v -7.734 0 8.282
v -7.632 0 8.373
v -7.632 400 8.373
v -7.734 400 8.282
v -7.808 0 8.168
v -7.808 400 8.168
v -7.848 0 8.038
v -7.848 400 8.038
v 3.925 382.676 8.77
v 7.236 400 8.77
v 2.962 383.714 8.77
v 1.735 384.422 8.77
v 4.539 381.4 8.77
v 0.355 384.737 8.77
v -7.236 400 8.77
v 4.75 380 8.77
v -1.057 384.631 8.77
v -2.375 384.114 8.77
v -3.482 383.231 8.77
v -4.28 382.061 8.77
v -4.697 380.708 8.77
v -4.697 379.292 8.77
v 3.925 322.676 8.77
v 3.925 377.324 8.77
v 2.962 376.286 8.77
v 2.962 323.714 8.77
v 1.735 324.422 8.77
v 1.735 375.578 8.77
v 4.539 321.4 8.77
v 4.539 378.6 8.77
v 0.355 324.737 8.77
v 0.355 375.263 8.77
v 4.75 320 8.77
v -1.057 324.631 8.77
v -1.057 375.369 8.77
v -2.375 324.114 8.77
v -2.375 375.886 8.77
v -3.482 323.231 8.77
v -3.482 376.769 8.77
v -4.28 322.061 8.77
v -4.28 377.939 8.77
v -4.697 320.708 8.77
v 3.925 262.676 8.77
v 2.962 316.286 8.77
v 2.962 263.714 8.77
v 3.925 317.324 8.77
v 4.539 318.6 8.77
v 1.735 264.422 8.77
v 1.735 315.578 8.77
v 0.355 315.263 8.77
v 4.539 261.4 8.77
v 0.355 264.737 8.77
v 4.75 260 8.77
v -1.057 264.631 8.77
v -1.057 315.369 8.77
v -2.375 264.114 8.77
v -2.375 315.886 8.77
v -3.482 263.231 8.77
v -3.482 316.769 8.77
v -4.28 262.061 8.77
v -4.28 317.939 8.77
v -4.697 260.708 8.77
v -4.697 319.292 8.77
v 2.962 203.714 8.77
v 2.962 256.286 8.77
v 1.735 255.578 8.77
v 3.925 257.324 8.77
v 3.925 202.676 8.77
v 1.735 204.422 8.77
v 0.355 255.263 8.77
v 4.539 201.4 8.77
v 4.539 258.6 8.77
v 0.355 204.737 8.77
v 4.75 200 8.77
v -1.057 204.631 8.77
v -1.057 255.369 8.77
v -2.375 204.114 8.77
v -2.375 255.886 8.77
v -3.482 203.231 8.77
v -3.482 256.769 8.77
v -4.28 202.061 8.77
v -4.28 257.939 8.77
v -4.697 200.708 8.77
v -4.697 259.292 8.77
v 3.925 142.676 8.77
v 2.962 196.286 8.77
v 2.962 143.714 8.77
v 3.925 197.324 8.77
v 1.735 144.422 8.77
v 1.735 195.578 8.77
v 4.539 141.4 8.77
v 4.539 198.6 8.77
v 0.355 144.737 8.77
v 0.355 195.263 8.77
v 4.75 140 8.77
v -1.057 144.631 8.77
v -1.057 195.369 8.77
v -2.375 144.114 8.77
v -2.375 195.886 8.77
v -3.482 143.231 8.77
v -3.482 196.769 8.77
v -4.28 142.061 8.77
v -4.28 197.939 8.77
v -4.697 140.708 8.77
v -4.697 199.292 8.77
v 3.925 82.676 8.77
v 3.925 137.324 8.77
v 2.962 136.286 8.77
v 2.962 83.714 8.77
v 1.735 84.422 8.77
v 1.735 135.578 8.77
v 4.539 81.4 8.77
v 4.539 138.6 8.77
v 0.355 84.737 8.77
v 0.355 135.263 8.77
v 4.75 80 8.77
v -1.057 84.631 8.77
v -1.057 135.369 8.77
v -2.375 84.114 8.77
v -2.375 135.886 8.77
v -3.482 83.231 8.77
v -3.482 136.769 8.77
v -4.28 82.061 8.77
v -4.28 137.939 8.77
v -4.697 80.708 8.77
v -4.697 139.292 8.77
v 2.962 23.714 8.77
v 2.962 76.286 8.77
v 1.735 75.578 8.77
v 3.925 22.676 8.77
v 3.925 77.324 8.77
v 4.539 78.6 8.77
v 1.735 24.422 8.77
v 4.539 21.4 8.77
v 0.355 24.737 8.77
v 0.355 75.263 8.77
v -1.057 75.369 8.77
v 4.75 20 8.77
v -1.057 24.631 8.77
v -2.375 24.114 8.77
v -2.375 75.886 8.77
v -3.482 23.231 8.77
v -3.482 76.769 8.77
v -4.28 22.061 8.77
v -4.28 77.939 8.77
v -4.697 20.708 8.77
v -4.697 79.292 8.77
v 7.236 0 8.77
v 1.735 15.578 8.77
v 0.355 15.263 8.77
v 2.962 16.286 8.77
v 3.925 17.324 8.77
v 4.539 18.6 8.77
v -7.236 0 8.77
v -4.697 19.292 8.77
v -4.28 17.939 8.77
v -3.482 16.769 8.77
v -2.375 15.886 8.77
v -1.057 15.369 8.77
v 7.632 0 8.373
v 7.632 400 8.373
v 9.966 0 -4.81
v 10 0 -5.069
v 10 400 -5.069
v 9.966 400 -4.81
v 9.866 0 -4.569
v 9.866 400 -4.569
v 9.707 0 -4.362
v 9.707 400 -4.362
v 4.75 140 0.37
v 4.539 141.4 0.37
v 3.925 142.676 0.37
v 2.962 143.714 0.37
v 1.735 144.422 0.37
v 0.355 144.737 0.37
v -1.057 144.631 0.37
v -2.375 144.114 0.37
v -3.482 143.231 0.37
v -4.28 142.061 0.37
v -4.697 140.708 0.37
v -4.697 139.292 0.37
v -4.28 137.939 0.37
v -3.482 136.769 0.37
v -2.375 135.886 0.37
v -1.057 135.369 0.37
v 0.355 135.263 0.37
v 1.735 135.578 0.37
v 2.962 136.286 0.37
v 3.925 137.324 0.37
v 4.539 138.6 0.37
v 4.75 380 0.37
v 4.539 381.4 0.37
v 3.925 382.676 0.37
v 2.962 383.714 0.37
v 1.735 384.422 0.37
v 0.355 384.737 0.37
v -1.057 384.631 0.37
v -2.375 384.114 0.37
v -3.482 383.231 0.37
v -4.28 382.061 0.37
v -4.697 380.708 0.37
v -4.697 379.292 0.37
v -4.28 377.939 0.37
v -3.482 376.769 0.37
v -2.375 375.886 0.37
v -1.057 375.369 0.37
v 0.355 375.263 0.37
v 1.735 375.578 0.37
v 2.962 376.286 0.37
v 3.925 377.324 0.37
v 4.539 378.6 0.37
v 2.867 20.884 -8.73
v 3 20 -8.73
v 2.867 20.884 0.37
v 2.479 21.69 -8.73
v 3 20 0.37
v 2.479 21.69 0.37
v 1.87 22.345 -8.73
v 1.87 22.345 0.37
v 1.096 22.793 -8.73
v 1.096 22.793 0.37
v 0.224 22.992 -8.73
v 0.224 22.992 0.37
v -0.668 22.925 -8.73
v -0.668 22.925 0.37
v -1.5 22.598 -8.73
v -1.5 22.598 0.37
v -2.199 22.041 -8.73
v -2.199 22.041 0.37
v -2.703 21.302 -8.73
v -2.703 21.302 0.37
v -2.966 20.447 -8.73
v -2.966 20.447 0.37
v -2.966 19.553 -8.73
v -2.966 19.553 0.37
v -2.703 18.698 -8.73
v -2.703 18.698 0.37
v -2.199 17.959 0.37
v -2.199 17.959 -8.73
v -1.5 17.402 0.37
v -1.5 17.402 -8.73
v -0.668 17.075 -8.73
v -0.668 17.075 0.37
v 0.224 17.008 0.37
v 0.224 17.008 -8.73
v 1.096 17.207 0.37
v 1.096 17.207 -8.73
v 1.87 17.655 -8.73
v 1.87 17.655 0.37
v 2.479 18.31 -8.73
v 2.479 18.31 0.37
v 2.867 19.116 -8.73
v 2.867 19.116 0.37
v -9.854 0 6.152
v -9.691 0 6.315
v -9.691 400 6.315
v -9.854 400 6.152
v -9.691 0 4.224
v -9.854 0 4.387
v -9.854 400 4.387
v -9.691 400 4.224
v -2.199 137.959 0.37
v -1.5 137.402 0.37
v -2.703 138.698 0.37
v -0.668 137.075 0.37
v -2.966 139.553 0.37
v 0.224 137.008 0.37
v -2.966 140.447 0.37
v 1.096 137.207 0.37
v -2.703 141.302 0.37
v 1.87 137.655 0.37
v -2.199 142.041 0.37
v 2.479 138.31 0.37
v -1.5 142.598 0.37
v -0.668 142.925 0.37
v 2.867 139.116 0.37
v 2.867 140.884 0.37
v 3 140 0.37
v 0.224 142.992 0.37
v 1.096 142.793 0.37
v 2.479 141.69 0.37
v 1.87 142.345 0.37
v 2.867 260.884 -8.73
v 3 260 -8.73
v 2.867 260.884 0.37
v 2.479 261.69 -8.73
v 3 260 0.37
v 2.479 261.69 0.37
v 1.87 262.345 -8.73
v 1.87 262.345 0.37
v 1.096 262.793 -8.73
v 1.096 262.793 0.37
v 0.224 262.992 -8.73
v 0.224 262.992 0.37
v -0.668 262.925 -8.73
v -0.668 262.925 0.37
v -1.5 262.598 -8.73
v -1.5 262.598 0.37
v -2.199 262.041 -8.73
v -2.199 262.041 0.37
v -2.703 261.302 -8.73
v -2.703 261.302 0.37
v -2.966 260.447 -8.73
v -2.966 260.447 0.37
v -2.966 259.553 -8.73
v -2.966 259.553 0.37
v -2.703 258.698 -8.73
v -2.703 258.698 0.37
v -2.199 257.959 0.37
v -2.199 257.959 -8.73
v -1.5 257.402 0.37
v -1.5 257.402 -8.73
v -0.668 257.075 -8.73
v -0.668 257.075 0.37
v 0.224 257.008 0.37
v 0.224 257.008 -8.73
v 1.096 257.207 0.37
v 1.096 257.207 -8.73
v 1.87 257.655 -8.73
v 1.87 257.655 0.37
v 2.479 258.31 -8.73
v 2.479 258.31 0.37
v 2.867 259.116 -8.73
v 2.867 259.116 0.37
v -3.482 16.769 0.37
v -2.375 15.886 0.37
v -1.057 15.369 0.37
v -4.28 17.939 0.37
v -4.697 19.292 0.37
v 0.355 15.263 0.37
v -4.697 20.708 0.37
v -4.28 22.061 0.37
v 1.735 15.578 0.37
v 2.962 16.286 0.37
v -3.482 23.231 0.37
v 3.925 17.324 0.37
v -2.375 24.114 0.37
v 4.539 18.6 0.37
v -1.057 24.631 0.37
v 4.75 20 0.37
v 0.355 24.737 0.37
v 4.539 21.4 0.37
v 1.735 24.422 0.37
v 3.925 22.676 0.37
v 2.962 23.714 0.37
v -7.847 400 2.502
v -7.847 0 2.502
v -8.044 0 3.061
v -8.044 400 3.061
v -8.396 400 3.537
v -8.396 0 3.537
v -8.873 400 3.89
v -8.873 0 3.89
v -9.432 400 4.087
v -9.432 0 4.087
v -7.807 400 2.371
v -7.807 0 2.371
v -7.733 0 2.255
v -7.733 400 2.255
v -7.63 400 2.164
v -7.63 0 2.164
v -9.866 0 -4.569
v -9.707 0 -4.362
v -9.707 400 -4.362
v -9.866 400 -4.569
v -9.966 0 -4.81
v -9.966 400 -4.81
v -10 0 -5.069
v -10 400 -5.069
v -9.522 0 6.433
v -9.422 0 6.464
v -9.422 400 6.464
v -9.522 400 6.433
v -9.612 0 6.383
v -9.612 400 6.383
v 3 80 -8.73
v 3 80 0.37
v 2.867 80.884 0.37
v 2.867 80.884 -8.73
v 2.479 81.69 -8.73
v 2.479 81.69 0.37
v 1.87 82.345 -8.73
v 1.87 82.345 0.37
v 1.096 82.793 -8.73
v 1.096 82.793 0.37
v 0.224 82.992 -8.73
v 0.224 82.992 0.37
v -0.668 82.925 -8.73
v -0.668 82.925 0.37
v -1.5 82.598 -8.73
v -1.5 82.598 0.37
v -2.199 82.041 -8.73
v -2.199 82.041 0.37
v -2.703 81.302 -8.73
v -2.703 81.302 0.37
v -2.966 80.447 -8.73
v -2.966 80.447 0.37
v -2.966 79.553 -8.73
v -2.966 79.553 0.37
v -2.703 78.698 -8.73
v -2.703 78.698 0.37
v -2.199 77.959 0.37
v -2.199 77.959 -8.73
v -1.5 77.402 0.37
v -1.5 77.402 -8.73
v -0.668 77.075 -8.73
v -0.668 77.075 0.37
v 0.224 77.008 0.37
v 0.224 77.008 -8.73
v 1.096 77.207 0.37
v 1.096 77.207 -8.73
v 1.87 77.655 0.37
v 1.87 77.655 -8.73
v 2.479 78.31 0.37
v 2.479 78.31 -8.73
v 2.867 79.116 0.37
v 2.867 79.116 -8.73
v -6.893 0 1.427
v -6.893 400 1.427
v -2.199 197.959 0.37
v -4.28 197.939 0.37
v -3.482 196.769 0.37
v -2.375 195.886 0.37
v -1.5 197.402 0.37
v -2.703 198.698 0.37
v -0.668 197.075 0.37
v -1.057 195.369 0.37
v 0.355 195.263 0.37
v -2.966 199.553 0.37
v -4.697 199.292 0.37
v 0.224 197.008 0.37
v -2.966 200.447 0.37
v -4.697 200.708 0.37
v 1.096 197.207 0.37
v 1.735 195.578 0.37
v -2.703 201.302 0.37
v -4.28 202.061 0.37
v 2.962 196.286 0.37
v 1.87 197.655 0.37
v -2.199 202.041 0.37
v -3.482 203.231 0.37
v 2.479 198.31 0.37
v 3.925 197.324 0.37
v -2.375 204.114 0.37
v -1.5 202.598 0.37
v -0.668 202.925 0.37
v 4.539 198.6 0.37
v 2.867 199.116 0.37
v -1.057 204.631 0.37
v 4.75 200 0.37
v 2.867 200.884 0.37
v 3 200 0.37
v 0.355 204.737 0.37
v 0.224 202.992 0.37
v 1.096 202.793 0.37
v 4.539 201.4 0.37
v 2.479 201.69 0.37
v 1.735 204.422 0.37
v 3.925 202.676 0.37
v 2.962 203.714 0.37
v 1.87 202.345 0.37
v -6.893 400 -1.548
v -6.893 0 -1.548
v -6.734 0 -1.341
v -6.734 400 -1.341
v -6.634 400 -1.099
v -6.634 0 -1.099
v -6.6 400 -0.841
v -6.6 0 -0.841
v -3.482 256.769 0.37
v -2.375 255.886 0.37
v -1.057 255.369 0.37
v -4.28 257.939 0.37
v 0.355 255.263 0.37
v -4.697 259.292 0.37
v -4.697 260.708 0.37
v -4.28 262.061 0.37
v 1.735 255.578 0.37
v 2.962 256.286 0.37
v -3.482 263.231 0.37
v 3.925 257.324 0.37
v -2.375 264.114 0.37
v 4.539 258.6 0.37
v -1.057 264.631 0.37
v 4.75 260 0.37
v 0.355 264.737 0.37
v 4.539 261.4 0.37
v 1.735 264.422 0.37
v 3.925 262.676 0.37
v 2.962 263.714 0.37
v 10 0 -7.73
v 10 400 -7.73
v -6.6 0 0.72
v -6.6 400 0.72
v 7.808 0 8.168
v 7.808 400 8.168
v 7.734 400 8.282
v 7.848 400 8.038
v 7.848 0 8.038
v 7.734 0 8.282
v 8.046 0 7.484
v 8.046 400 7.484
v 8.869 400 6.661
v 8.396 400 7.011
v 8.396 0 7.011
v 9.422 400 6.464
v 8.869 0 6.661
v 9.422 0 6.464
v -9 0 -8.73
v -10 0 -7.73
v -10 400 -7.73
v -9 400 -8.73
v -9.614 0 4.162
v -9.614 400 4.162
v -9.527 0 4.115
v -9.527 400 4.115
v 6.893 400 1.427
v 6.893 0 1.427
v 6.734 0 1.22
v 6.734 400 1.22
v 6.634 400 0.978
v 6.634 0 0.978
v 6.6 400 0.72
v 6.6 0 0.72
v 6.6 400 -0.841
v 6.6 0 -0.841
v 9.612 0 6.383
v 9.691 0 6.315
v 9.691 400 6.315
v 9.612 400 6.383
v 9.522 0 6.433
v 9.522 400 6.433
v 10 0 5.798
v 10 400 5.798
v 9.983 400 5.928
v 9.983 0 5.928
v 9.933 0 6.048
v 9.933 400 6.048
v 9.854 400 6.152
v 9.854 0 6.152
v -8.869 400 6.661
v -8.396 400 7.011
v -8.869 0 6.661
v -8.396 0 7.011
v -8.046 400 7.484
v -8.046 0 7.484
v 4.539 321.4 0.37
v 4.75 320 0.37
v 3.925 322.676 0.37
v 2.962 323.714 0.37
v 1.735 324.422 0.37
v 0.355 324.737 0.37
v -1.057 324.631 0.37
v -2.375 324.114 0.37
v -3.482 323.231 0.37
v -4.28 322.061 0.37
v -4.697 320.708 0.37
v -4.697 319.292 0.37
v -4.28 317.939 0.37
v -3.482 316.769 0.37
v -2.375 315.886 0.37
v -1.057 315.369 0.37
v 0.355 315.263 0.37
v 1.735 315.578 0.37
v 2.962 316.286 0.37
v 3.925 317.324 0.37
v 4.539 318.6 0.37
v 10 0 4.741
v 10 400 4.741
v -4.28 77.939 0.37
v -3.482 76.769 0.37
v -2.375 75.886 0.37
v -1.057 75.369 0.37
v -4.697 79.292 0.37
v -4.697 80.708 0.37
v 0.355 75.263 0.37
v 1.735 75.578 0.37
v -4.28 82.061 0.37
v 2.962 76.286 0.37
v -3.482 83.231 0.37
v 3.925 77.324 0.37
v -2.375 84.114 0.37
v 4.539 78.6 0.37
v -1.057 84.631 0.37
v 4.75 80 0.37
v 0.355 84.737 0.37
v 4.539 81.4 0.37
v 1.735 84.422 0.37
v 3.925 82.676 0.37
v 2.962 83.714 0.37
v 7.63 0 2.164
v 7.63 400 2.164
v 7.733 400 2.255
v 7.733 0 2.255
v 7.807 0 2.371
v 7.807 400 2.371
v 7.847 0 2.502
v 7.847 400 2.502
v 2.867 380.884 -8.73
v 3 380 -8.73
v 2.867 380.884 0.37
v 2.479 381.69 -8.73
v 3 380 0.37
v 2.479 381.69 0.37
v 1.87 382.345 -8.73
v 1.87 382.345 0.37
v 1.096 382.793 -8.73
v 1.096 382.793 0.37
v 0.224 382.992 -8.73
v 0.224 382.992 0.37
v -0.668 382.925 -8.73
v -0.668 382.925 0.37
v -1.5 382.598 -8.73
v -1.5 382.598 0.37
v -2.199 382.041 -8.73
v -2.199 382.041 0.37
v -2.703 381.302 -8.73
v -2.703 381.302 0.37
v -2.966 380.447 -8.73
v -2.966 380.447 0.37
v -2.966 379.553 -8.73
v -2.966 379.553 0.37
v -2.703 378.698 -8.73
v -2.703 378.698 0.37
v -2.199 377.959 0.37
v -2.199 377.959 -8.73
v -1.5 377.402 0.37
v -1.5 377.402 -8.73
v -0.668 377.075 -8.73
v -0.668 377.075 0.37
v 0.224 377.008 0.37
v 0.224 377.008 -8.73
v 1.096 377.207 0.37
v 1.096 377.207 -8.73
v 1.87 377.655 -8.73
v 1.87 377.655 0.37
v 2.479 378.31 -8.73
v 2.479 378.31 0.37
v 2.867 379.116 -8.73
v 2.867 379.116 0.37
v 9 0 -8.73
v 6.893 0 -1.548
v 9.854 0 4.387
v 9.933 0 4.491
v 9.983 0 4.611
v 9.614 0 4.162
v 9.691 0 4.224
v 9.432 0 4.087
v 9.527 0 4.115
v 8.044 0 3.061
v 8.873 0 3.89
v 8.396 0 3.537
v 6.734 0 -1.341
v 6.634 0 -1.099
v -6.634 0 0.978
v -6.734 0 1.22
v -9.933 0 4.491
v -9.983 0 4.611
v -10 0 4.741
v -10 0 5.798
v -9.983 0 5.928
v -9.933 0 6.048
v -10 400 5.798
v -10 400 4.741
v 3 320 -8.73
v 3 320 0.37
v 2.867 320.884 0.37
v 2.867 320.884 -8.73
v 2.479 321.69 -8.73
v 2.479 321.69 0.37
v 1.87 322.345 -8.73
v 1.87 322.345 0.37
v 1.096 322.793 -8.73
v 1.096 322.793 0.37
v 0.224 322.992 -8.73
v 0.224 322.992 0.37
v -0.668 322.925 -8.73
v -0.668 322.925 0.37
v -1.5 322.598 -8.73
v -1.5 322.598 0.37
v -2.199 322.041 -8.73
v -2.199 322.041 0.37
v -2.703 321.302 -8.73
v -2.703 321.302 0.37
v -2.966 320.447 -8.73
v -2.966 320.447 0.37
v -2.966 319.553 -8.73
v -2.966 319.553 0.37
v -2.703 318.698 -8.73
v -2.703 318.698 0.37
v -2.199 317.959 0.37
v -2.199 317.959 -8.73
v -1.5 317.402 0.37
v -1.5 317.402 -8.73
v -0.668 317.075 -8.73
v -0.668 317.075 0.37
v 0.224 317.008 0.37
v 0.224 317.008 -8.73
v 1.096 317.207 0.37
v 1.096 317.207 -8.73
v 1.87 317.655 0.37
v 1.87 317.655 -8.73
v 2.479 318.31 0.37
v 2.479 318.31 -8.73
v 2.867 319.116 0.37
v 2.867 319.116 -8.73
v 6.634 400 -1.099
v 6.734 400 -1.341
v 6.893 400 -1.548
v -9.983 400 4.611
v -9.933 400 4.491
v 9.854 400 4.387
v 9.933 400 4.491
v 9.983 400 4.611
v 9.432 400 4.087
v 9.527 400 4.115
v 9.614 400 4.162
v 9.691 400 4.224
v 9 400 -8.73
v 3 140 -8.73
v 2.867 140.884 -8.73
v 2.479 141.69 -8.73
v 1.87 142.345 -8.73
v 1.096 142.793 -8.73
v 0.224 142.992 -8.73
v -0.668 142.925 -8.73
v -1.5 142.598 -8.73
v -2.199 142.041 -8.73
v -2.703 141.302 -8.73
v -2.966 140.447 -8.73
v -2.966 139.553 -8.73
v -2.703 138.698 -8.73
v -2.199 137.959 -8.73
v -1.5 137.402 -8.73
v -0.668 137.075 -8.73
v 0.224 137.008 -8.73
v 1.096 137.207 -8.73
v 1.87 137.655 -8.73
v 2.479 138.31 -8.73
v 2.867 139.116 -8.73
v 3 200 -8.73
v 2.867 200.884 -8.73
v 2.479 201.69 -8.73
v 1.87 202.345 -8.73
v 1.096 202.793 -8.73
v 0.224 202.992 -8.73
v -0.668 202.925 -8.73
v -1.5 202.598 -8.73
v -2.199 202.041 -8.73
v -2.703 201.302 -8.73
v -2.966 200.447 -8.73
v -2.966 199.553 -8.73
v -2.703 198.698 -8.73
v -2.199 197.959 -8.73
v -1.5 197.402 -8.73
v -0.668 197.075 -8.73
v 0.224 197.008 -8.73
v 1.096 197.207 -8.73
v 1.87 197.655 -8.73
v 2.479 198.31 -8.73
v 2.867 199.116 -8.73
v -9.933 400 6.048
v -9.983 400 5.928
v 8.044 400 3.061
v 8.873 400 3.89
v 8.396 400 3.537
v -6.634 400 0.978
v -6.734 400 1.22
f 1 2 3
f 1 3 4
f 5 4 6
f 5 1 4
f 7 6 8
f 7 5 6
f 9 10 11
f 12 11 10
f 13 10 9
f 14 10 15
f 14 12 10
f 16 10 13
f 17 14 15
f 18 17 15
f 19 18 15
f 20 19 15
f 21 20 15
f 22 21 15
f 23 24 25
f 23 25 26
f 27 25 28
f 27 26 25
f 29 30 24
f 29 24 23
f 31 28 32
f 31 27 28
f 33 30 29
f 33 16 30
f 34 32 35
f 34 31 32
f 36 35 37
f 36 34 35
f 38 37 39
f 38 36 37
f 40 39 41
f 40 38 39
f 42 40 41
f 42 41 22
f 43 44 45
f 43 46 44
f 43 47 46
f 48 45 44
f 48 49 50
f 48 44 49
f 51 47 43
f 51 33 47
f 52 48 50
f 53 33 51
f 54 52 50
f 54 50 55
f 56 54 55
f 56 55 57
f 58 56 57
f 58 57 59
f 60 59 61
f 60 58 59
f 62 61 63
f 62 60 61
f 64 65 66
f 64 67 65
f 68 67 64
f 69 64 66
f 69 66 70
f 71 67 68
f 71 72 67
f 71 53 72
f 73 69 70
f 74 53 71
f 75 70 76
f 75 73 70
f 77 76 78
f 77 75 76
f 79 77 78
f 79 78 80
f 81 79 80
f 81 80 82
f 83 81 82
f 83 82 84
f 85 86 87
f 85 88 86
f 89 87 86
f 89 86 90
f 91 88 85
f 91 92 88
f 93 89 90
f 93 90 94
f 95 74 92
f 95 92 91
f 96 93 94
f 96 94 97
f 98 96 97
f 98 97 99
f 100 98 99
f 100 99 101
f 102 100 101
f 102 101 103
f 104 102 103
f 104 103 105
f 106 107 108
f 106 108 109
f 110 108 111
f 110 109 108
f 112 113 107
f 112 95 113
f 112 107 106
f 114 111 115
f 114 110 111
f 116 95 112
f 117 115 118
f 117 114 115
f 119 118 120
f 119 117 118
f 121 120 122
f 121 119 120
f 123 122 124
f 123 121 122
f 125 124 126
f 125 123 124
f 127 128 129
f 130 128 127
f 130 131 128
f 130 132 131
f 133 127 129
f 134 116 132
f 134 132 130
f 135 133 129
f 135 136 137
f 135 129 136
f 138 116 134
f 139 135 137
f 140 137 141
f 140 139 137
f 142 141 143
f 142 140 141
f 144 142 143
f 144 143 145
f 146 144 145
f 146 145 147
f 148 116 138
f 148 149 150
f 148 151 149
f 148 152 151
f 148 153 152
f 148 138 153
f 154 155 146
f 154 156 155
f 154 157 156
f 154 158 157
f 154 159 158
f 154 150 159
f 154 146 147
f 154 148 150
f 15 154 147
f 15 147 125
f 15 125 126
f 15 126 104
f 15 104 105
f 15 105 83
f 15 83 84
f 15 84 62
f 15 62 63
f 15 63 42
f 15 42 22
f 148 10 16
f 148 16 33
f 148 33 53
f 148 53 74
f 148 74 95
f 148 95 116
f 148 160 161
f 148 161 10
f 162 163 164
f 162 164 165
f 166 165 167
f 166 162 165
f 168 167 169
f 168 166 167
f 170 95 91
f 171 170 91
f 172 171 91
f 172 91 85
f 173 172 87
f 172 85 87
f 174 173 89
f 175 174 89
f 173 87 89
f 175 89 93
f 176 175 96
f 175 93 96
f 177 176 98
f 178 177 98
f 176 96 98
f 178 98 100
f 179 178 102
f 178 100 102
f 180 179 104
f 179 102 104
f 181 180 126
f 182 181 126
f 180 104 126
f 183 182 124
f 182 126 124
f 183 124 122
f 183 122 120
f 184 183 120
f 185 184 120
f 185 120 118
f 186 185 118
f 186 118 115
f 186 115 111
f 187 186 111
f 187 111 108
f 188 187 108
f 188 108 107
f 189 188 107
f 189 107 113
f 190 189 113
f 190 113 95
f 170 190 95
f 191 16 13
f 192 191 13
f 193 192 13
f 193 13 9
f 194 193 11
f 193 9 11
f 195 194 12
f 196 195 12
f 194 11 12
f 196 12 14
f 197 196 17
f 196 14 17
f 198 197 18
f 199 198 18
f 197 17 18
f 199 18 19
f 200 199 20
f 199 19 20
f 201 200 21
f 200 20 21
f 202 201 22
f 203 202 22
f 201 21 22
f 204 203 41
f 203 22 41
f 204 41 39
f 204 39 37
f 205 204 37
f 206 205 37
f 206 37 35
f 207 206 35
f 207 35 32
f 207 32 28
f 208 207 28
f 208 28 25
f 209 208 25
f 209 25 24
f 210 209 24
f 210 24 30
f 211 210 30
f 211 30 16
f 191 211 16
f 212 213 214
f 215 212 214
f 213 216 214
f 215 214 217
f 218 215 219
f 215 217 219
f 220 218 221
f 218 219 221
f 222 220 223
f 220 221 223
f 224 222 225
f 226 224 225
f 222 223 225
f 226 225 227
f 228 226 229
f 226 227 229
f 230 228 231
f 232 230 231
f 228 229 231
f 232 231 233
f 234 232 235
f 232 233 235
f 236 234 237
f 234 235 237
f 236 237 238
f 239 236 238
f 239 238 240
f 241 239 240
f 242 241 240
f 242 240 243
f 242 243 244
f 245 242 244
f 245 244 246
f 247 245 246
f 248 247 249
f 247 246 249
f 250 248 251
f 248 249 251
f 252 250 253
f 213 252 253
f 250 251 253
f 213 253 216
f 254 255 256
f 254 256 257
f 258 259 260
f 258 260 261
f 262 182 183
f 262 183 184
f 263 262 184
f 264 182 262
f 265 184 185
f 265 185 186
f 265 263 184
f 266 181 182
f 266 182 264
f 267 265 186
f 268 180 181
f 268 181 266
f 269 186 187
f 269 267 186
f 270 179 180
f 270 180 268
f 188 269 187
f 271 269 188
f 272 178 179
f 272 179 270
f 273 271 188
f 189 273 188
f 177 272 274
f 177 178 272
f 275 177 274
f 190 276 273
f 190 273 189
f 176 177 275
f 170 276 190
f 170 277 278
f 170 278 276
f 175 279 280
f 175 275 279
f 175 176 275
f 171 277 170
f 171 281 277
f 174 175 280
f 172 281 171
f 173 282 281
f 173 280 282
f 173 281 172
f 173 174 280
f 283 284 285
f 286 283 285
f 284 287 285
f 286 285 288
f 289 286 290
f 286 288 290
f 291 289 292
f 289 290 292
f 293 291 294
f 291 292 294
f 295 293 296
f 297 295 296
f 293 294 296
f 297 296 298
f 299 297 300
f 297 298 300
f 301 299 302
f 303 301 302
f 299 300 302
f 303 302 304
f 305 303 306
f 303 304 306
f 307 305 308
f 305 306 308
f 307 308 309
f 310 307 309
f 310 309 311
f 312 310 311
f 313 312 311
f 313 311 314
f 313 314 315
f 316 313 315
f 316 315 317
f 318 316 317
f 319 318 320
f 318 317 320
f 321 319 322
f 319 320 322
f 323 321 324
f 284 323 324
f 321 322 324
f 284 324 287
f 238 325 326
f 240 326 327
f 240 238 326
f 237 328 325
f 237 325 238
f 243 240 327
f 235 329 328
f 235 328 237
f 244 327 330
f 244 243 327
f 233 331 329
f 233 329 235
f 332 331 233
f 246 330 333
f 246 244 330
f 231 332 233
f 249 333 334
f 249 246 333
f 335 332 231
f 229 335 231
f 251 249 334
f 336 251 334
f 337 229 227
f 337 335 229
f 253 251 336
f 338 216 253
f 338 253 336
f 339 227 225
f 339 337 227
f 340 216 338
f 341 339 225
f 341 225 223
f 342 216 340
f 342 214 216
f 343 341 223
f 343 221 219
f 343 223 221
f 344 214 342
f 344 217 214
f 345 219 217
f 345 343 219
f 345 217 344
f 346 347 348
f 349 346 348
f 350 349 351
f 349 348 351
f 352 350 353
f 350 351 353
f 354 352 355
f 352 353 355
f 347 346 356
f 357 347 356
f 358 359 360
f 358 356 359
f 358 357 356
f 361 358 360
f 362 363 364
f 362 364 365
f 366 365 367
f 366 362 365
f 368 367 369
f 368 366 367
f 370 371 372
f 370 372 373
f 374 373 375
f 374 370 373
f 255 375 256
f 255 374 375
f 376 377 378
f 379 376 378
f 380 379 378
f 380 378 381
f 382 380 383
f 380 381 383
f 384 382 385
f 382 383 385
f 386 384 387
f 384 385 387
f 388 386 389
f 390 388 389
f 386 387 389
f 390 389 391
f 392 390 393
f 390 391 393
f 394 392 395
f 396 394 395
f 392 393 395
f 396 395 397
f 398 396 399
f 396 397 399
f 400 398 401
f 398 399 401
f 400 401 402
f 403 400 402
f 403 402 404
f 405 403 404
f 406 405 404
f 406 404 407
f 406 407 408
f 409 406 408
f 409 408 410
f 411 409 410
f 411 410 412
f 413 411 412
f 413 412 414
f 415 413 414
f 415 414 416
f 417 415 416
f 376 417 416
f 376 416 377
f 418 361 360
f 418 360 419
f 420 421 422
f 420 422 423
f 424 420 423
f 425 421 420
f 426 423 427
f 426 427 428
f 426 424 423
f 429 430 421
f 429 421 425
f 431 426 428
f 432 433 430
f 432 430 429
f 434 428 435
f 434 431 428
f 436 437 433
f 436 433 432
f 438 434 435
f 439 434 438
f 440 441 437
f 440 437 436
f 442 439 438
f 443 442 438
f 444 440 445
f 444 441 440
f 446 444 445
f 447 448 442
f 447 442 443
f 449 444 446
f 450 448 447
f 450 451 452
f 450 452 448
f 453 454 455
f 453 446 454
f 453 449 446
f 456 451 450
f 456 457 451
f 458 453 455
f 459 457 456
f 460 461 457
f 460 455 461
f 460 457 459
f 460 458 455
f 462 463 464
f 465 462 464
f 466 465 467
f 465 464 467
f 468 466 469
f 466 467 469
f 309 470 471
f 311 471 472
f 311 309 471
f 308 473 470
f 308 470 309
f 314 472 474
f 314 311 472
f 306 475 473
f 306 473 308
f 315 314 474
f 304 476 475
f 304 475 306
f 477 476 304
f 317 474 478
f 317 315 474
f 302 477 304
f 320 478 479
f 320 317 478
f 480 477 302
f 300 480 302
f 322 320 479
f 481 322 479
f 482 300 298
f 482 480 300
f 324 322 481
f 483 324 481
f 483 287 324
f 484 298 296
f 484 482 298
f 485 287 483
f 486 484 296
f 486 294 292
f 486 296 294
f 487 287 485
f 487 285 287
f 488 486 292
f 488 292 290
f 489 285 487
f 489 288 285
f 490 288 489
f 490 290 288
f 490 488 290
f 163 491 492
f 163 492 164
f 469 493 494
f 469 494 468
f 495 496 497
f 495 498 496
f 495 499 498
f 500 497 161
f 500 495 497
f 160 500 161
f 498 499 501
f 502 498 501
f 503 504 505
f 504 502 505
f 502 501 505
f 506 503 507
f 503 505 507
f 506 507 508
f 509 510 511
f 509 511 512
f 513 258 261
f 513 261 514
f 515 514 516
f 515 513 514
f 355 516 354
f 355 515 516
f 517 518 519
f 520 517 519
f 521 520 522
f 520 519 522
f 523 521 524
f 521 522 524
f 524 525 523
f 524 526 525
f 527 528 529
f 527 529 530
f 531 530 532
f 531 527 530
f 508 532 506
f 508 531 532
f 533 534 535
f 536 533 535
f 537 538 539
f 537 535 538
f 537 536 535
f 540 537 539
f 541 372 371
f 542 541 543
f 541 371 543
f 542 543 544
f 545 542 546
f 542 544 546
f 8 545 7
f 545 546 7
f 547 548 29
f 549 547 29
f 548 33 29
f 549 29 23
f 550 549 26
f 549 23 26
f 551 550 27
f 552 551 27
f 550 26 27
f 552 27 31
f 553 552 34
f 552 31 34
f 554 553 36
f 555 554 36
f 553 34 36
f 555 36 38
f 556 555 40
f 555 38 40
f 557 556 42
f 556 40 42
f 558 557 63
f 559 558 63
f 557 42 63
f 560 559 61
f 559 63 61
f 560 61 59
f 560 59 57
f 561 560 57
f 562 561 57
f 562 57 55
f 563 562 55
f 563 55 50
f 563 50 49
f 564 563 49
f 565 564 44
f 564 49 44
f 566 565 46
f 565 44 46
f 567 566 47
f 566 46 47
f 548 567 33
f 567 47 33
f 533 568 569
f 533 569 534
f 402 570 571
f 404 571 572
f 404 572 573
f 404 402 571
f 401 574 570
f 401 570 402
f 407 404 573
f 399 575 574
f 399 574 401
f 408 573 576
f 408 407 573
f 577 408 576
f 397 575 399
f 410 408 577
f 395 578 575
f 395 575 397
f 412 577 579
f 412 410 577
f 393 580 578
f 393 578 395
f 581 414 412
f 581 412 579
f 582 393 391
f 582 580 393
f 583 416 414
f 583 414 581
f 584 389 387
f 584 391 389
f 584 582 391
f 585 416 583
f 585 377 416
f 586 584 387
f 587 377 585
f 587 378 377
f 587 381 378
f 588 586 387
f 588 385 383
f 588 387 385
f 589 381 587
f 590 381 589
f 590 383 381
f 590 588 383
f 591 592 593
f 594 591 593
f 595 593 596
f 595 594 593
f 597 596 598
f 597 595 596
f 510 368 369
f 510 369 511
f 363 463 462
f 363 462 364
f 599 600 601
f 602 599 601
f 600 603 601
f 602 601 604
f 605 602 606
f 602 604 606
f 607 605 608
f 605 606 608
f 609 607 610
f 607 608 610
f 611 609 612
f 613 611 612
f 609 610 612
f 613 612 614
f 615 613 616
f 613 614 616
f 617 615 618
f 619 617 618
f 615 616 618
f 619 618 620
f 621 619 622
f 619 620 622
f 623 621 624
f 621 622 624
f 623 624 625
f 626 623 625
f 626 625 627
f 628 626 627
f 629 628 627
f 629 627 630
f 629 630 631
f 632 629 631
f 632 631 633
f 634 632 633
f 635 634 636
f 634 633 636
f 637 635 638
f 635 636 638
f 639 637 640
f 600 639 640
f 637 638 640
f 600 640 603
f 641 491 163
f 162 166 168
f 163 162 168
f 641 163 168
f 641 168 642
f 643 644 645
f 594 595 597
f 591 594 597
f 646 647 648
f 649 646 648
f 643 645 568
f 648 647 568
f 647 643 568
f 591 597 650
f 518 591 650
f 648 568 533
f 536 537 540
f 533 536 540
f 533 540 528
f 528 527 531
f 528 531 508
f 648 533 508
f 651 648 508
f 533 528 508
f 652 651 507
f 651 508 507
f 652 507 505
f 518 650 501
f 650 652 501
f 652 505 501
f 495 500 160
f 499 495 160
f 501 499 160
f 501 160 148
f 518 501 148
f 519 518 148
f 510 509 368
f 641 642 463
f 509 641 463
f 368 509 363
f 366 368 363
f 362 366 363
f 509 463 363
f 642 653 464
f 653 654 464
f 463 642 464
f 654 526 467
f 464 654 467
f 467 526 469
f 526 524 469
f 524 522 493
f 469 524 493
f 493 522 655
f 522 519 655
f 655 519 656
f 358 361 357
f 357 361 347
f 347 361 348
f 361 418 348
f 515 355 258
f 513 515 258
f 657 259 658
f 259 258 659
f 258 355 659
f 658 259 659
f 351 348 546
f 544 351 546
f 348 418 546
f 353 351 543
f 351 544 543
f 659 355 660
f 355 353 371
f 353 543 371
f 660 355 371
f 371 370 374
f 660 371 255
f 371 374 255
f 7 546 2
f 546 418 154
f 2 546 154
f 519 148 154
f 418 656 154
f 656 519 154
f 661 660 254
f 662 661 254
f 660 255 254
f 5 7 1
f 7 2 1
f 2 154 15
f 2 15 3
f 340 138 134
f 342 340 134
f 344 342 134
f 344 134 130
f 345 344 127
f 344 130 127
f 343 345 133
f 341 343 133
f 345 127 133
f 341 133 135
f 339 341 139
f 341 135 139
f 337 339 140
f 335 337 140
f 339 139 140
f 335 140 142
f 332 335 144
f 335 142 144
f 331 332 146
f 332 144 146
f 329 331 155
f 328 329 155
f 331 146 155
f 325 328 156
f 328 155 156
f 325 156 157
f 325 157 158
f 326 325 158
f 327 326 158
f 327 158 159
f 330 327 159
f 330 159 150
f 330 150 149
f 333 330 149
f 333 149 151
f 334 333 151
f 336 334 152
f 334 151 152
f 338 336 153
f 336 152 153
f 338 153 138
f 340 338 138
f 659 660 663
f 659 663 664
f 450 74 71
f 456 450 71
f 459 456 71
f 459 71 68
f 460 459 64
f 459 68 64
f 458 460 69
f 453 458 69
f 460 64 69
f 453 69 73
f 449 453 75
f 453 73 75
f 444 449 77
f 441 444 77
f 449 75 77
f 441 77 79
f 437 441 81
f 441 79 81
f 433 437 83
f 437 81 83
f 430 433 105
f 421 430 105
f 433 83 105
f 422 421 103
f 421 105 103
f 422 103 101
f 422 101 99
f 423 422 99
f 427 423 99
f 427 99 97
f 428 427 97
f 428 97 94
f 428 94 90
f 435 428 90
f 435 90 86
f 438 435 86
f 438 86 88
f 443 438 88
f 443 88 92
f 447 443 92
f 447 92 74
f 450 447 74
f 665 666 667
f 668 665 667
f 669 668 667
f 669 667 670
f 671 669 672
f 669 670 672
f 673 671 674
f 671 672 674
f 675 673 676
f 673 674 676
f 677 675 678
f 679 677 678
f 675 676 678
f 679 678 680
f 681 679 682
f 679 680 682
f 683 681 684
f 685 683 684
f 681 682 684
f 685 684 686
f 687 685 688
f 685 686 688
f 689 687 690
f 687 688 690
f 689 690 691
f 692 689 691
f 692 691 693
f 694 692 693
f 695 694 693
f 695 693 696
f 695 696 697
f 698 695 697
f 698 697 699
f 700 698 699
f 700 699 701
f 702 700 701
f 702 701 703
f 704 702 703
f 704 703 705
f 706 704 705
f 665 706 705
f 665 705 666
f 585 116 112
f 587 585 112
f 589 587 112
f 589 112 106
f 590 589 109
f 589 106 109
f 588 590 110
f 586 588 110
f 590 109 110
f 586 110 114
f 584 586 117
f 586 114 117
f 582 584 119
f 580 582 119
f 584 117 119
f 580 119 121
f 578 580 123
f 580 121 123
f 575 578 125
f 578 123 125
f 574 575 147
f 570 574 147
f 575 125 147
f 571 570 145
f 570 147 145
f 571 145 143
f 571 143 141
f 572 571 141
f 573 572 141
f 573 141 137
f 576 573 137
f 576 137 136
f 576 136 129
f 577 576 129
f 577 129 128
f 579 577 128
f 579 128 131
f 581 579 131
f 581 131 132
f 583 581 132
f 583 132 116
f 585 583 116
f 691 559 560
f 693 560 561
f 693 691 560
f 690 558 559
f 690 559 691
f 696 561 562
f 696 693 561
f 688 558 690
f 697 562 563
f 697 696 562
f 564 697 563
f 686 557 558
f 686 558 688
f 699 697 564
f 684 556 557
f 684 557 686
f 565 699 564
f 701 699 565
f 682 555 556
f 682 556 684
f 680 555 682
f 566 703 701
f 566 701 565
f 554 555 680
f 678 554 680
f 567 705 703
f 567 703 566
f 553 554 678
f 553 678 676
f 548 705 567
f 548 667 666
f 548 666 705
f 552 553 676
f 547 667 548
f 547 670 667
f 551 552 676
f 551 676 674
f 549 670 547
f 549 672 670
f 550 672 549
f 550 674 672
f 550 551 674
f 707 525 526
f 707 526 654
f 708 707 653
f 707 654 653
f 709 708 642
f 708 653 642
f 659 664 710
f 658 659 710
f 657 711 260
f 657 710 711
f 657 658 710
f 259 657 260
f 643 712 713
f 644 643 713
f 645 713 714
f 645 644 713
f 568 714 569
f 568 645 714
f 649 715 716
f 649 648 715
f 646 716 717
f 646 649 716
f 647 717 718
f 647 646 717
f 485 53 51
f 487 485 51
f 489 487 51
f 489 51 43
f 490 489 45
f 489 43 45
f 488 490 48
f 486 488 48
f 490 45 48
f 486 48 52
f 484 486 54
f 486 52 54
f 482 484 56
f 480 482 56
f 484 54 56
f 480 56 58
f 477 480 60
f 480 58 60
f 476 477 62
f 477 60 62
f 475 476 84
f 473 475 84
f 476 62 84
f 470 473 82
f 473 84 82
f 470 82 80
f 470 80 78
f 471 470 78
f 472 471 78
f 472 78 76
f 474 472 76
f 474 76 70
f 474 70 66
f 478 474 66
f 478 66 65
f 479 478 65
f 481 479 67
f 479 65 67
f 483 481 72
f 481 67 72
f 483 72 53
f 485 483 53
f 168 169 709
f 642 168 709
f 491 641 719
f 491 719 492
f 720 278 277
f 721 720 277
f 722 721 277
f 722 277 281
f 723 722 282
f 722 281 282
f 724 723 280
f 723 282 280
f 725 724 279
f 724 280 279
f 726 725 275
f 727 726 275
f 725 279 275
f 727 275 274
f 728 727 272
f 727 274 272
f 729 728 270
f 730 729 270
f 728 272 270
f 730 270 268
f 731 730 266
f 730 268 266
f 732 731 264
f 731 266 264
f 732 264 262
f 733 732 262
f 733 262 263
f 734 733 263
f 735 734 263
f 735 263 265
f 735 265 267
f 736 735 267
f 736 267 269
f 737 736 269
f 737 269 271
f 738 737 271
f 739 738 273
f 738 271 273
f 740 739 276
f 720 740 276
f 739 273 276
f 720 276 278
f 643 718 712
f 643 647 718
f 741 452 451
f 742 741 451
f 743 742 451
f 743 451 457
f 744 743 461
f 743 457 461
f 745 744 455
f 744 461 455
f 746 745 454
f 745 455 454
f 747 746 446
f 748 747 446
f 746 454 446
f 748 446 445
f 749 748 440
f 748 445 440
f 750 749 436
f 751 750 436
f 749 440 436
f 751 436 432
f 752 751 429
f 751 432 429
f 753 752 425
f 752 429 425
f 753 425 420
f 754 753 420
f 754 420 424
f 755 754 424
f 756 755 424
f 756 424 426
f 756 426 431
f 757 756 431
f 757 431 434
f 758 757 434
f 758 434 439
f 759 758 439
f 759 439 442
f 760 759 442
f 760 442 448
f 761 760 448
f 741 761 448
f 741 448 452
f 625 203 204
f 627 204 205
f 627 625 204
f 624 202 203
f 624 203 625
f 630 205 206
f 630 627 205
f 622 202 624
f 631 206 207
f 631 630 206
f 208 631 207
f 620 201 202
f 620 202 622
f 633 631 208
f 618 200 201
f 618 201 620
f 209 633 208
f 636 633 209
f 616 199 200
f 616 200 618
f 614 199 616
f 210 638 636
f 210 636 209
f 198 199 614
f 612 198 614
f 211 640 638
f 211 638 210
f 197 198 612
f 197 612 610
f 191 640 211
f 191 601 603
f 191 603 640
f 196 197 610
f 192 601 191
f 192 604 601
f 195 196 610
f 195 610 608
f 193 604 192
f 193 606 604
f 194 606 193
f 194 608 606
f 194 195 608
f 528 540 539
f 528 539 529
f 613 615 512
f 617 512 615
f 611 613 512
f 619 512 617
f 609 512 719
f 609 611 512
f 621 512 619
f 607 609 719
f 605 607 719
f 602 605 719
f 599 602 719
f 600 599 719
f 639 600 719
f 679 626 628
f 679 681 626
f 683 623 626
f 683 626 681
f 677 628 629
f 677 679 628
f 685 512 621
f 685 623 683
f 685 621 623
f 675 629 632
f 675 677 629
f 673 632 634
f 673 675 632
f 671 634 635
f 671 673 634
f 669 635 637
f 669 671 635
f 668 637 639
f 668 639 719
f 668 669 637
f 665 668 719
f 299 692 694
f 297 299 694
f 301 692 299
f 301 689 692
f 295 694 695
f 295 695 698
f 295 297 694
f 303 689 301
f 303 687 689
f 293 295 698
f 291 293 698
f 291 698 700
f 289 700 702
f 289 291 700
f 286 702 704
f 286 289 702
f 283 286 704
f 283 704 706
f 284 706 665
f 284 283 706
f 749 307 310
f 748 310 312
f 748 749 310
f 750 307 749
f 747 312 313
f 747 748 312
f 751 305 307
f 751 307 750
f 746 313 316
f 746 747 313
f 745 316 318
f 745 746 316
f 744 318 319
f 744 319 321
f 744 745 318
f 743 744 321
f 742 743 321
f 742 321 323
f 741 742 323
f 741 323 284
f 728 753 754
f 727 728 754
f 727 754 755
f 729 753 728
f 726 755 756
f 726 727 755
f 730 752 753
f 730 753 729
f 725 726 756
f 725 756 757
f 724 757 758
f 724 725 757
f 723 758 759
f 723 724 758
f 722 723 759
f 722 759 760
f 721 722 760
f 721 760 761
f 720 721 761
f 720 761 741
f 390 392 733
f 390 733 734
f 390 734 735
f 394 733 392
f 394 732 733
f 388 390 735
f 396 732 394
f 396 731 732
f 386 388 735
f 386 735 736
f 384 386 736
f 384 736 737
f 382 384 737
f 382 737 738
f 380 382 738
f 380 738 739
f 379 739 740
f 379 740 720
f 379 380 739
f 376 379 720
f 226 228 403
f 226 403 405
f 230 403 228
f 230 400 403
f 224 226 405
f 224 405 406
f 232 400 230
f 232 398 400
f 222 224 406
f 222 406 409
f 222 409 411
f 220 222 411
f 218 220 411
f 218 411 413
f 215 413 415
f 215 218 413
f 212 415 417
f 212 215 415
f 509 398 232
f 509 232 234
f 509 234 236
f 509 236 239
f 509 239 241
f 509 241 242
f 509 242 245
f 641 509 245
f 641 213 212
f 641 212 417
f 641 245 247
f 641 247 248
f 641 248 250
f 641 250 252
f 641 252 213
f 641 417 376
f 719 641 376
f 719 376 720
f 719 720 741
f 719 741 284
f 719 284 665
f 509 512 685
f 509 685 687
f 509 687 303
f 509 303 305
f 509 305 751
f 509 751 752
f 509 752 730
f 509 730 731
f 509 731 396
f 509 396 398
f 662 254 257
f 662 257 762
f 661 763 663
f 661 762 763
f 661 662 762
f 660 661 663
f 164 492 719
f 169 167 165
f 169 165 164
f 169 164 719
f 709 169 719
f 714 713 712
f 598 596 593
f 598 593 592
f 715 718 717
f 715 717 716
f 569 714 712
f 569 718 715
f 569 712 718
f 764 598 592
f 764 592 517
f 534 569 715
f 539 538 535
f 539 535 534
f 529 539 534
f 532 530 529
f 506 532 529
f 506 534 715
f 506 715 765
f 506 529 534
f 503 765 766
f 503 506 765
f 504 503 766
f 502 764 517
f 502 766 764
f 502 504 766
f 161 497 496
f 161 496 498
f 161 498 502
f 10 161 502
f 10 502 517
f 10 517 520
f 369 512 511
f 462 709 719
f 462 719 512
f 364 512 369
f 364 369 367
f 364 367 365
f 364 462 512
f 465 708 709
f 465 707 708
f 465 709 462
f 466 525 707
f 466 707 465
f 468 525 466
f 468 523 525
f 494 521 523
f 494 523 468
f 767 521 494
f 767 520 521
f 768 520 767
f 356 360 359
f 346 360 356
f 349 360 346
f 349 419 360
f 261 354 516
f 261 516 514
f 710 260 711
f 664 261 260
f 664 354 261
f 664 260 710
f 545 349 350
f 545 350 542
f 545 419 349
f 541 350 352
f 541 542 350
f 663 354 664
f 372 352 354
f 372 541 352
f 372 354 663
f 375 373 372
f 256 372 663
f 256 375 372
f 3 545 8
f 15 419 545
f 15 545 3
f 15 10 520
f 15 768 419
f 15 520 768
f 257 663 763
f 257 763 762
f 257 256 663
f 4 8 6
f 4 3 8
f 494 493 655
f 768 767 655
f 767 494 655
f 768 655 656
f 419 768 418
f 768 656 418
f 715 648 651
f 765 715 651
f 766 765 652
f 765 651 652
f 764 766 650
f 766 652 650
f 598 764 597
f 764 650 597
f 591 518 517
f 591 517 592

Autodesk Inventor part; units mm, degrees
ref_plane "YZ Plane" through (0, 0, 0) normal (1, 0, 0) x (0, 1, 0)
ref_plane "XZ Plane" through (0, 0, 0) normal (0, 1, 0) x (-1, 0, 0)
ref_plane "XY Plane" through (0, 0, 0) normal (0, 0, 1) x (1, 0, 0)
sketch "Sketch1" plane through (0, 0, 0) normal (0, 1, 0) x (-1, 0, 0)
  arc A0 (-9.8536, 6.1517) -> (-10, 5.7981) centre (-9.5, 5.7981) ccw
  line L0 (-10, 4.7409) -> (-10, 5.7981)
  arc A1 (-10, 4.7409) -> (-9.8536, 4.3873) centre (-9.5, 4.7409) ccw
  line L1 (-9.6906, 4.2244) -> (-9.8536, 4.3873)
  arc A2 (-9.6906, 4.2244) -> (-9.4318, 4.087) centre (-9.3371, 4.578) ccw
  arc A3 (-7.8468, 2.502) -> (-9.4318, 4.087) centre (-9.8106, 2.1232) ccw
  arc A4 (-7.8468, 2.502) -> (-7.6302, 2.1639) centre (-7.3529, 2.58) ccw
  line L2 (-6.8929, 1.4267) -> (-7.6302, 2.1639)
  arc A5 (-6.6, 0.7196) -> (-6.8929, 1.4267) centre (-7.6, 0.7196) ccw
  line L3 (-6.6, -0.8406) -> (-6.6, 0.7196)
  arc A6 (-6.8929, -1.5477) -> (-6.6, -0.8406) centre (-7.6, -0.8406) ccw
  line L4 (-9.7071, -4.3619) -> (-6.8929, -1.5477)
  arc A7 (-9.7071, -4.3619) -> (-10, -5.069) centre (-9, -5.069) ccw
  line L5 (-10, -7.7305) -> (-10, -5.069)
  line L6 (-9, -8.7305) -> (-10, -7.7305)
  line L7 (9, -8.7305) -> (-9, -8.7305)
  line L8 (10, -7.7305) -> (9, -8.7305)
  line L9 (10, -5.069) -> (10, -7.7305)
  arc A8 (10, -5.069) -> (9.7071, -4.3619) centre (9, -5.069) ccw
  line L10 (6.8929, -1.5477) -> (9.7071, -4.3619)
  arc A9 (6.6, -0.8406) -> (6.8929, -1.5477) centre (7.6, -0.8406) ccw
  line L11 (6.6, 0.7196) -> (6.6, -0.8406)
  arc A10 (6.8929, 1.4267) -> (6.6, 0.7196) centre (7.6, 0.7196) ccw
  line L12 (7.6302, 2.1639) -> (6.8929, 1.4267)
  arc A11 (7.6302, 2.1639) -> (7.8468, 2.502) centre (7.3529, 2.58) ccw
  arc A12 (9.4318, 4.087) -> (7.8468, 2.502) centre (9.8106, 2.1232) ccw
  arc A13 (9.4318, 4.087) -> (9.6906, 4.2244) centre (9.3371, 4.578) ccw
  line L13 (9.8536, 4.3873) -> (9.6906, 4.2244)
  arc A14 (9.8536, 4.3873) -> (10, 4.7409) centre (9.5, 4.7409) ccw
  line L14 (10, 5.7981) -> (10, 4.7409)
  arc A15 (10, 5.7981) -> (9.8536, 6.1517) centre (9.5, 5.7981) ccw
  line L15 (9.6906, 6.3146) -> (9.8536, 6.1517)
  arc A16 (9.6906, 6.3146) -> (9.4224, 6.4636) centre (9.3254, 5.9731) ccw
  arc A17 (7.8482, 8.0375) -> (9.4224, 6.4636) centre (9.8101, 8.4256) ccw
  arc A18 (7.8482, 8.0375) -> (7.6325, 8.3727) centre (7.3547, 7.957) ccw
  line L16 (7.2357, 8.7695) -> (7.6325, 8.3727)
  line L17 (-7.2357, 8.7695) -> (7.2357, 8.7695)
  line L18 (-7.6325, 8.3727) -> (-7.2357, 8.7695)
  arc A19 (-7.6325, 8.3727) -> (-7.8482, 8.0375) centre (-7.3547, 7.957) ccw
  arc A20 (-9.4224, 6.4636) -> (-7.8482, 8.0375) centre (-9.8101, 8.4256) ccw
  arc A21 (-9.4224, 6.4636) -> (-9.6906, 6.3146) centre (-9.3254, 5.9731) ccw
  line L19 (-9.8536, 6.1517) -> (-9.6906, 6.3146)
  point P0 (0, 0)
  point P1 (0, 5.2695)
extrude "Extrusion1" add sketch "Sketch1" along normal blind 400
sketch "Sketch2" plane through (-7.2357, 0, 8.7695) normal (0, 0, 1) x (1, 0, 0)
  circle A0 centre (7.2357, 20) radius 3
  line L0 (0, 0) -> (14.4714, 0) projected
  circle A1 centre (7.2357, 80) radius 3
  circle A2 centre (7.2357, 140) radius 3
  circle A3 centre (7.2357, 200) radius 3
  circle A4 centre (7.2357, 260) radius 3
  circle A5 centre (7.2357, 320) radius 3
  circle A6 centre (7.2357, 380) radius 3
  point P0 (7.2357, 0)
  point P1 (7.2357, 0)
  dimension "d2" = 6
  dimension "d3" = 20
  dimension "d4" = 60
  dimension "d5" = 60
  dimension "d6" = 60
  dimension "d7" = 60
  dimension "d13" = 60
  dimension "d14" = 60
extrude "Extrusion2" cut sketch "Sketch2" against normal through all contours A0 | A1 | A2 | A3 | A4
sketch "Sketch3" plane through (-7.2357, 0, 8.7695) normal (0, 0, 1) x (1, 0, 0)
  circle A0 centre (7.2357, 140) radius 3 projected
  circle A1 centre (7.2357, 80) radius 3 projected
  circle A2 centre (7.2357, 200) radius 3 projected
  circle A3 centre (7.2357, 20) radius 3 projected
  circle A4 centre (7.2357, 260) radius 3 projected
  line L0 (0, 0) -> (14.4714, 0) projected
  line L1 (14.4714, 0) -> (14.4714, 400) projected
  line L2 (0, 400) -> (14.4714, 400) projected
  line L3 (0, 0) -> (0, 400) projected
  circle A5 centre (7.2357, 20) radius 4.75
  circle A6 centre (7.2357, 80) radius 4.75
  circle A7 centre (7.2357, 140) radius 4.75
  circle A8 centre (7.2357, 200) radius 4.75
  circle A9 centre (7.2357, 260) radius 4.75
  circle A10 centre (7.2357, 320) radius 4.75
  circle A11 centre (7.2357, 380) radius 4.75
  point P0 (7.2357, 0)
  dimension "d10" = 9.5
  dimension "d17" = 60
  dimension "d18" = 60
extrude "Extrusion3" cut sketch "Sketch3" against normal blind 8.4 contours A1 | A5 | A6 | A7 | A8 | A9
extrude "Extrusion4" cut sketch "Sketch2" against normal through all contours A5 | A6
extrude "Extrusion5" cut sketch "Sketch3" against normal up to surface (8.4 mm away) contours A10 | A11
equation "\"d5\" = d4"
equation "\"d6\" = d5"
equation "\"d7\" = d6"
equation "\"d13\" = d7"
equation "\"d14\" = d13"
equation "\"d18\" = d17"
properties part number "HGR20R-LinearRail300mm" material "Stainless Steel"
